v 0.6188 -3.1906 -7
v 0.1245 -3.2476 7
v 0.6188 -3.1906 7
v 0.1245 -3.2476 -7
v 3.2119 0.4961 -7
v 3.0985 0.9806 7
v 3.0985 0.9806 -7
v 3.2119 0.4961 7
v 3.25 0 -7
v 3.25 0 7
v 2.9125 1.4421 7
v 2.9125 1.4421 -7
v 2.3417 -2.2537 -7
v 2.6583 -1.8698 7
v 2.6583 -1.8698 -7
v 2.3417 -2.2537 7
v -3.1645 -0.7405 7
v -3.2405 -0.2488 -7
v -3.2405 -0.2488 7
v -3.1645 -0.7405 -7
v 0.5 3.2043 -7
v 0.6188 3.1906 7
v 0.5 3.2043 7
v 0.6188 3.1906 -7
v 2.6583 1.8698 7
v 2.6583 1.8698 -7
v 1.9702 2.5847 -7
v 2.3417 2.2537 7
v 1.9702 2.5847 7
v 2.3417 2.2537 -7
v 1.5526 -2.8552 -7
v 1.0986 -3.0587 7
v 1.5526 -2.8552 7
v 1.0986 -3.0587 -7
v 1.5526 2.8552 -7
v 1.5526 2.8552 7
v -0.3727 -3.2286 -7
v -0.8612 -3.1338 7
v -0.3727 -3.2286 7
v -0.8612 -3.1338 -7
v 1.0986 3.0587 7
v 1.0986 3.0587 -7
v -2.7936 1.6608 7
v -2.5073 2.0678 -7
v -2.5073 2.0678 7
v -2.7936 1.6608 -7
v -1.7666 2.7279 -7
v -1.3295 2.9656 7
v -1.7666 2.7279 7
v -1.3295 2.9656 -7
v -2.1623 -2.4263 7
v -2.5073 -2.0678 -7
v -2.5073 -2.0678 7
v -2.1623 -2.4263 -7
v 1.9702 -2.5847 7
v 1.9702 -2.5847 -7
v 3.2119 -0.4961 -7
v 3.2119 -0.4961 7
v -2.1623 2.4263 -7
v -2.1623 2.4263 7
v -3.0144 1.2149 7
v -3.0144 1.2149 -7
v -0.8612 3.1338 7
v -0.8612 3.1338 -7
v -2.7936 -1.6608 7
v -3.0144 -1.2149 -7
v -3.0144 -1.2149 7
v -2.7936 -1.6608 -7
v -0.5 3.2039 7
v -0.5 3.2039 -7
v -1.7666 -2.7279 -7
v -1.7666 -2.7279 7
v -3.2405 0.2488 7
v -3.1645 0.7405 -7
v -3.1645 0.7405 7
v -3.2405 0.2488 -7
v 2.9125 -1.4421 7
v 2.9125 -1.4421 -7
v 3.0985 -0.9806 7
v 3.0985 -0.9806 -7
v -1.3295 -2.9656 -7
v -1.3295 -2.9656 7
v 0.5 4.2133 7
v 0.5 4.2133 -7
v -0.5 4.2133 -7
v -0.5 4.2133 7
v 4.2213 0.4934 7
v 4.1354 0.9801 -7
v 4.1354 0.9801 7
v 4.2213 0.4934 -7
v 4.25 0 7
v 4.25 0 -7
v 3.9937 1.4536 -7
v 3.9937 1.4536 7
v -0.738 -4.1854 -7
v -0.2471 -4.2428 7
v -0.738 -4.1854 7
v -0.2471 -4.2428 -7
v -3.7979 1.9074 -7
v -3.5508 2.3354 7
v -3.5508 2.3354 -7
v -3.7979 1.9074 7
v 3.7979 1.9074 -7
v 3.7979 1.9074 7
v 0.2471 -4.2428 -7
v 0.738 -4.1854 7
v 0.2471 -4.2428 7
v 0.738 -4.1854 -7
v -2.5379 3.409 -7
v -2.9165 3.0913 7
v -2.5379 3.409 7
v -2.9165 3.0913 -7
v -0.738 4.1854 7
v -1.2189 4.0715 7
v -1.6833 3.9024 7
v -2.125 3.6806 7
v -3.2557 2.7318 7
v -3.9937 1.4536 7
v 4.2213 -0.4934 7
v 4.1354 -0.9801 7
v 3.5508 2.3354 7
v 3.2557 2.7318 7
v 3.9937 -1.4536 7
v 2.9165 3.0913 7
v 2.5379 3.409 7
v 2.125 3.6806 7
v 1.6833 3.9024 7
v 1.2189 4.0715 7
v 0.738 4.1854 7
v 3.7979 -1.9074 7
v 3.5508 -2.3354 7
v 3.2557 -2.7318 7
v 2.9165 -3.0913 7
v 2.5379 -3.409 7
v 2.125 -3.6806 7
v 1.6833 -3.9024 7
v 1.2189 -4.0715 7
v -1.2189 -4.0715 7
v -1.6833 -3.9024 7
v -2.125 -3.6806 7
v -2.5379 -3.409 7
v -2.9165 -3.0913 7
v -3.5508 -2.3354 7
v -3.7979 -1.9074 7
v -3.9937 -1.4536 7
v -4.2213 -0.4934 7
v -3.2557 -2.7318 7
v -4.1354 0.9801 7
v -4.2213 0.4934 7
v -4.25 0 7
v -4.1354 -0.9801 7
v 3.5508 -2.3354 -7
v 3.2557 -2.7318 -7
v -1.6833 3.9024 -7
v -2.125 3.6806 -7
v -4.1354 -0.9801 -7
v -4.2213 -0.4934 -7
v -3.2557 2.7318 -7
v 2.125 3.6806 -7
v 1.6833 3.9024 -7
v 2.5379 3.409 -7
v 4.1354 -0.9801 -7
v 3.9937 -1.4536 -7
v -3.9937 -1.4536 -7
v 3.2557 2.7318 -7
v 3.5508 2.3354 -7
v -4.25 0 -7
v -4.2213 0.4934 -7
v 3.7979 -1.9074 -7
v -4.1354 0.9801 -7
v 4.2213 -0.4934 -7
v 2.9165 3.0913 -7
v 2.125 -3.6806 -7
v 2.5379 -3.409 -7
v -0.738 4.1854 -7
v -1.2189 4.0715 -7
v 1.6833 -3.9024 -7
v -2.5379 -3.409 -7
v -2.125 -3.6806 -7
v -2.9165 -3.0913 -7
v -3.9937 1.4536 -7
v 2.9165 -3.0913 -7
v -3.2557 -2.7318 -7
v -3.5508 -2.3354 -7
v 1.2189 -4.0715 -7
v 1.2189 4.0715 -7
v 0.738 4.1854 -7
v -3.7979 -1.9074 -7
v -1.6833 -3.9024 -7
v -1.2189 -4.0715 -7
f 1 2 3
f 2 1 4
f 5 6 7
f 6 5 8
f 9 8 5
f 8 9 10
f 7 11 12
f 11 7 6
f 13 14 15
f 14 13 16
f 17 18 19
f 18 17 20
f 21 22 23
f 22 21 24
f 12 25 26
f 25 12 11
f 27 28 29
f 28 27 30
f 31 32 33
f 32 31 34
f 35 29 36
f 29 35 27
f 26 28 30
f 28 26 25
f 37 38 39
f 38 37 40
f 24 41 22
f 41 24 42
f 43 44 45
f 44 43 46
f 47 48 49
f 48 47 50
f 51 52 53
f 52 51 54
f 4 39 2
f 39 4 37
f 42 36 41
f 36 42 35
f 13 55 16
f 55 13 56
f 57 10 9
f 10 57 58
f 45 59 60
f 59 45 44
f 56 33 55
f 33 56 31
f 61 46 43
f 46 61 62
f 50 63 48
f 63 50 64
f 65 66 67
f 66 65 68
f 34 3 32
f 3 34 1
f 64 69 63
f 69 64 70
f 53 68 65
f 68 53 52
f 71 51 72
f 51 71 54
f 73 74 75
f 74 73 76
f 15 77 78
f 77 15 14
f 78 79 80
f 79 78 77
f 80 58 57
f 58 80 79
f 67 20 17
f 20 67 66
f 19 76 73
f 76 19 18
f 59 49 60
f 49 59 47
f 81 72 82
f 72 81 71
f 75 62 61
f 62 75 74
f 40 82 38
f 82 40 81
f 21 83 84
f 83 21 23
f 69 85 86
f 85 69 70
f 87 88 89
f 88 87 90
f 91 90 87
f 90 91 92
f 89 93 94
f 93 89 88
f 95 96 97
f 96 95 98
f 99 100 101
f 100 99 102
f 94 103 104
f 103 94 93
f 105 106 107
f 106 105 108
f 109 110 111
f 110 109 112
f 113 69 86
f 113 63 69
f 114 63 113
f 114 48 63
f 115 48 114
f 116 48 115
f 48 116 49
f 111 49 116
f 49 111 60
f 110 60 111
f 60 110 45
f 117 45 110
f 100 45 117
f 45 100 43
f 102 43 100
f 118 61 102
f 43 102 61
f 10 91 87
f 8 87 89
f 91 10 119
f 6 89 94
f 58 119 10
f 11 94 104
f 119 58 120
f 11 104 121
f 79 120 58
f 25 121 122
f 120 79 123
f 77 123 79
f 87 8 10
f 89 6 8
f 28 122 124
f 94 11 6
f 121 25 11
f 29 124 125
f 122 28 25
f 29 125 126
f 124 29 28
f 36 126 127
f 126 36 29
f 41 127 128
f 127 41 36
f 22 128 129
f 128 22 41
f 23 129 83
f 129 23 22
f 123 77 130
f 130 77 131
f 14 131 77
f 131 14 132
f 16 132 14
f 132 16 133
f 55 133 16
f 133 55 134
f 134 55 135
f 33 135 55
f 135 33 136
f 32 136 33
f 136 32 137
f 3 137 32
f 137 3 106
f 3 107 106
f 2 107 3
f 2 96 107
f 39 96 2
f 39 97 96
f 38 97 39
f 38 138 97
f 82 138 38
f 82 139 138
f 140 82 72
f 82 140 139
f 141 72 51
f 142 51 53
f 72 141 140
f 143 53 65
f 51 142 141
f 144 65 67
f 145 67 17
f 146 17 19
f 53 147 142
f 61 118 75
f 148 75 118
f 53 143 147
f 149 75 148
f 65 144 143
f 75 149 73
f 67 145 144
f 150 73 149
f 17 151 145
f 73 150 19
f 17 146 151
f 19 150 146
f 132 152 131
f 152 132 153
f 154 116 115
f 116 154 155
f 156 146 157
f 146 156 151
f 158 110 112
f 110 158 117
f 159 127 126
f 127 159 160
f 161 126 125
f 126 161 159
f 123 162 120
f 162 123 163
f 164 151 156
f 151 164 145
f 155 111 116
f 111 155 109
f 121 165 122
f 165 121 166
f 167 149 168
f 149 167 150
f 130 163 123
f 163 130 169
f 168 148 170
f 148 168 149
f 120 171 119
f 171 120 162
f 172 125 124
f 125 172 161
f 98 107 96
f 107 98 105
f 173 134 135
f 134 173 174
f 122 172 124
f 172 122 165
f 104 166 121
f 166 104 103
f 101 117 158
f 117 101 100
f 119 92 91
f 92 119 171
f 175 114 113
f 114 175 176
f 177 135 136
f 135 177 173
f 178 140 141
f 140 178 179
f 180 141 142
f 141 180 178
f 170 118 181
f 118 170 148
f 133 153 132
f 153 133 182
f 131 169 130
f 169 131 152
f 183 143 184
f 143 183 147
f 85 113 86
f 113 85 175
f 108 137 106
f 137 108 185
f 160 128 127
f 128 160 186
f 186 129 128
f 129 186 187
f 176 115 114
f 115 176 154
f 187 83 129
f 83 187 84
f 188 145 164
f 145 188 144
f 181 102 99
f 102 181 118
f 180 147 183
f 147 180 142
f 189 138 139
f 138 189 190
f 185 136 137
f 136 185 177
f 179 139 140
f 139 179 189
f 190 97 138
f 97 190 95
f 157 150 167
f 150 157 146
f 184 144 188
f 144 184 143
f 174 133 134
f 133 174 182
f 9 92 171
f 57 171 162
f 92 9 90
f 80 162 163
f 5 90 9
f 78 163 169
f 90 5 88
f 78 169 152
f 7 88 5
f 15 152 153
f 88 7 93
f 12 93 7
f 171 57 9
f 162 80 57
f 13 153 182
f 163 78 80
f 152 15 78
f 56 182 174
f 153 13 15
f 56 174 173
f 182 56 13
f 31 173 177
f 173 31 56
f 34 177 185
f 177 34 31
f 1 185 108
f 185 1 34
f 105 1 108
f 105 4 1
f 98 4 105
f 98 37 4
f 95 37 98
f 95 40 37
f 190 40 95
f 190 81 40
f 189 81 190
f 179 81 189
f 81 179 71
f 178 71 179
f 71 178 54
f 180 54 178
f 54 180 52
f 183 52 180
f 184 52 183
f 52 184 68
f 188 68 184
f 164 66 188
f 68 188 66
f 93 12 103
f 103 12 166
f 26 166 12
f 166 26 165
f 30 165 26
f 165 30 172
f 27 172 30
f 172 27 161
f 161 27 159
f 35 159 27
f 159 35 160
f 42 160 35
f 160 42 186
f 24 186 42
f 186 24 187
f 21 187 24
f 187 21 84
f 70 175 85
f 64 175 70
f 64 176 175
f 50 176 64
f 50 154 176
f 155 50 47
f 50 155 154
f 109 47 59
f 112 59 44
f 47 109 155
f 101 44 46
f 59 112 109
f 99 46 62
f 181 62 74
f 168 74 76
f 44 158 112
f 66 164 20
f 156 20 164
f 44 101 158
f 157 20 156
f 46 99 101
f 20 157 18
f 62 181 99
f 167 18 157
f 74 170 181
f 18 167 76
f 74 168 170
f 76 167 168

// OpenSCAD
/////////////////////////////////////////////////////////////////////////////////
// LED illuminator to hide the LED from the receiver diode. 
//
// Author:              Maximilian Stiefel
// Last modification:   22.06.2017
/////////////////////////////////////////////////////////////////////////////////

/////////////////////////////////////////////////////////////////////////////////
// Includes
/////////////////////////////////////////////////////////////////////////////////

/////////////////////////////////////////////////////////////////////////////////
// Vars
/////////////////////////////////////////////////////////////////////////////////
$fa = 0.5; // minimum facet angle is now 0.5
$fs = 0.5; // minimum facet size is now 0.5 mm

holder_height = 14;
holder_diameter = 8.5;
holder_hole_diameter = 6.5; // LED with 5 mm diameter should fit in
holder_slot_width = 1;
/////////////////////////////////////////////////////////////////////////////////
// Action
/////////////////////////////////////////////////////////////////////////////////
difference()
{
	cylinder(h = holder_height, r = holder_diameter/2, center = true);
	union()
	{
		translate([0, 0, 0])
		cylinder(h = holder_height + 2, r = holder_hole_diameter/2, center = true);
		translate([0, holder_diameter/2, 0])
		cube([holder_slot_width, 2*(holder_diameter-holder_hole_diameter), holder_height + 2], center = true);
	}
}
